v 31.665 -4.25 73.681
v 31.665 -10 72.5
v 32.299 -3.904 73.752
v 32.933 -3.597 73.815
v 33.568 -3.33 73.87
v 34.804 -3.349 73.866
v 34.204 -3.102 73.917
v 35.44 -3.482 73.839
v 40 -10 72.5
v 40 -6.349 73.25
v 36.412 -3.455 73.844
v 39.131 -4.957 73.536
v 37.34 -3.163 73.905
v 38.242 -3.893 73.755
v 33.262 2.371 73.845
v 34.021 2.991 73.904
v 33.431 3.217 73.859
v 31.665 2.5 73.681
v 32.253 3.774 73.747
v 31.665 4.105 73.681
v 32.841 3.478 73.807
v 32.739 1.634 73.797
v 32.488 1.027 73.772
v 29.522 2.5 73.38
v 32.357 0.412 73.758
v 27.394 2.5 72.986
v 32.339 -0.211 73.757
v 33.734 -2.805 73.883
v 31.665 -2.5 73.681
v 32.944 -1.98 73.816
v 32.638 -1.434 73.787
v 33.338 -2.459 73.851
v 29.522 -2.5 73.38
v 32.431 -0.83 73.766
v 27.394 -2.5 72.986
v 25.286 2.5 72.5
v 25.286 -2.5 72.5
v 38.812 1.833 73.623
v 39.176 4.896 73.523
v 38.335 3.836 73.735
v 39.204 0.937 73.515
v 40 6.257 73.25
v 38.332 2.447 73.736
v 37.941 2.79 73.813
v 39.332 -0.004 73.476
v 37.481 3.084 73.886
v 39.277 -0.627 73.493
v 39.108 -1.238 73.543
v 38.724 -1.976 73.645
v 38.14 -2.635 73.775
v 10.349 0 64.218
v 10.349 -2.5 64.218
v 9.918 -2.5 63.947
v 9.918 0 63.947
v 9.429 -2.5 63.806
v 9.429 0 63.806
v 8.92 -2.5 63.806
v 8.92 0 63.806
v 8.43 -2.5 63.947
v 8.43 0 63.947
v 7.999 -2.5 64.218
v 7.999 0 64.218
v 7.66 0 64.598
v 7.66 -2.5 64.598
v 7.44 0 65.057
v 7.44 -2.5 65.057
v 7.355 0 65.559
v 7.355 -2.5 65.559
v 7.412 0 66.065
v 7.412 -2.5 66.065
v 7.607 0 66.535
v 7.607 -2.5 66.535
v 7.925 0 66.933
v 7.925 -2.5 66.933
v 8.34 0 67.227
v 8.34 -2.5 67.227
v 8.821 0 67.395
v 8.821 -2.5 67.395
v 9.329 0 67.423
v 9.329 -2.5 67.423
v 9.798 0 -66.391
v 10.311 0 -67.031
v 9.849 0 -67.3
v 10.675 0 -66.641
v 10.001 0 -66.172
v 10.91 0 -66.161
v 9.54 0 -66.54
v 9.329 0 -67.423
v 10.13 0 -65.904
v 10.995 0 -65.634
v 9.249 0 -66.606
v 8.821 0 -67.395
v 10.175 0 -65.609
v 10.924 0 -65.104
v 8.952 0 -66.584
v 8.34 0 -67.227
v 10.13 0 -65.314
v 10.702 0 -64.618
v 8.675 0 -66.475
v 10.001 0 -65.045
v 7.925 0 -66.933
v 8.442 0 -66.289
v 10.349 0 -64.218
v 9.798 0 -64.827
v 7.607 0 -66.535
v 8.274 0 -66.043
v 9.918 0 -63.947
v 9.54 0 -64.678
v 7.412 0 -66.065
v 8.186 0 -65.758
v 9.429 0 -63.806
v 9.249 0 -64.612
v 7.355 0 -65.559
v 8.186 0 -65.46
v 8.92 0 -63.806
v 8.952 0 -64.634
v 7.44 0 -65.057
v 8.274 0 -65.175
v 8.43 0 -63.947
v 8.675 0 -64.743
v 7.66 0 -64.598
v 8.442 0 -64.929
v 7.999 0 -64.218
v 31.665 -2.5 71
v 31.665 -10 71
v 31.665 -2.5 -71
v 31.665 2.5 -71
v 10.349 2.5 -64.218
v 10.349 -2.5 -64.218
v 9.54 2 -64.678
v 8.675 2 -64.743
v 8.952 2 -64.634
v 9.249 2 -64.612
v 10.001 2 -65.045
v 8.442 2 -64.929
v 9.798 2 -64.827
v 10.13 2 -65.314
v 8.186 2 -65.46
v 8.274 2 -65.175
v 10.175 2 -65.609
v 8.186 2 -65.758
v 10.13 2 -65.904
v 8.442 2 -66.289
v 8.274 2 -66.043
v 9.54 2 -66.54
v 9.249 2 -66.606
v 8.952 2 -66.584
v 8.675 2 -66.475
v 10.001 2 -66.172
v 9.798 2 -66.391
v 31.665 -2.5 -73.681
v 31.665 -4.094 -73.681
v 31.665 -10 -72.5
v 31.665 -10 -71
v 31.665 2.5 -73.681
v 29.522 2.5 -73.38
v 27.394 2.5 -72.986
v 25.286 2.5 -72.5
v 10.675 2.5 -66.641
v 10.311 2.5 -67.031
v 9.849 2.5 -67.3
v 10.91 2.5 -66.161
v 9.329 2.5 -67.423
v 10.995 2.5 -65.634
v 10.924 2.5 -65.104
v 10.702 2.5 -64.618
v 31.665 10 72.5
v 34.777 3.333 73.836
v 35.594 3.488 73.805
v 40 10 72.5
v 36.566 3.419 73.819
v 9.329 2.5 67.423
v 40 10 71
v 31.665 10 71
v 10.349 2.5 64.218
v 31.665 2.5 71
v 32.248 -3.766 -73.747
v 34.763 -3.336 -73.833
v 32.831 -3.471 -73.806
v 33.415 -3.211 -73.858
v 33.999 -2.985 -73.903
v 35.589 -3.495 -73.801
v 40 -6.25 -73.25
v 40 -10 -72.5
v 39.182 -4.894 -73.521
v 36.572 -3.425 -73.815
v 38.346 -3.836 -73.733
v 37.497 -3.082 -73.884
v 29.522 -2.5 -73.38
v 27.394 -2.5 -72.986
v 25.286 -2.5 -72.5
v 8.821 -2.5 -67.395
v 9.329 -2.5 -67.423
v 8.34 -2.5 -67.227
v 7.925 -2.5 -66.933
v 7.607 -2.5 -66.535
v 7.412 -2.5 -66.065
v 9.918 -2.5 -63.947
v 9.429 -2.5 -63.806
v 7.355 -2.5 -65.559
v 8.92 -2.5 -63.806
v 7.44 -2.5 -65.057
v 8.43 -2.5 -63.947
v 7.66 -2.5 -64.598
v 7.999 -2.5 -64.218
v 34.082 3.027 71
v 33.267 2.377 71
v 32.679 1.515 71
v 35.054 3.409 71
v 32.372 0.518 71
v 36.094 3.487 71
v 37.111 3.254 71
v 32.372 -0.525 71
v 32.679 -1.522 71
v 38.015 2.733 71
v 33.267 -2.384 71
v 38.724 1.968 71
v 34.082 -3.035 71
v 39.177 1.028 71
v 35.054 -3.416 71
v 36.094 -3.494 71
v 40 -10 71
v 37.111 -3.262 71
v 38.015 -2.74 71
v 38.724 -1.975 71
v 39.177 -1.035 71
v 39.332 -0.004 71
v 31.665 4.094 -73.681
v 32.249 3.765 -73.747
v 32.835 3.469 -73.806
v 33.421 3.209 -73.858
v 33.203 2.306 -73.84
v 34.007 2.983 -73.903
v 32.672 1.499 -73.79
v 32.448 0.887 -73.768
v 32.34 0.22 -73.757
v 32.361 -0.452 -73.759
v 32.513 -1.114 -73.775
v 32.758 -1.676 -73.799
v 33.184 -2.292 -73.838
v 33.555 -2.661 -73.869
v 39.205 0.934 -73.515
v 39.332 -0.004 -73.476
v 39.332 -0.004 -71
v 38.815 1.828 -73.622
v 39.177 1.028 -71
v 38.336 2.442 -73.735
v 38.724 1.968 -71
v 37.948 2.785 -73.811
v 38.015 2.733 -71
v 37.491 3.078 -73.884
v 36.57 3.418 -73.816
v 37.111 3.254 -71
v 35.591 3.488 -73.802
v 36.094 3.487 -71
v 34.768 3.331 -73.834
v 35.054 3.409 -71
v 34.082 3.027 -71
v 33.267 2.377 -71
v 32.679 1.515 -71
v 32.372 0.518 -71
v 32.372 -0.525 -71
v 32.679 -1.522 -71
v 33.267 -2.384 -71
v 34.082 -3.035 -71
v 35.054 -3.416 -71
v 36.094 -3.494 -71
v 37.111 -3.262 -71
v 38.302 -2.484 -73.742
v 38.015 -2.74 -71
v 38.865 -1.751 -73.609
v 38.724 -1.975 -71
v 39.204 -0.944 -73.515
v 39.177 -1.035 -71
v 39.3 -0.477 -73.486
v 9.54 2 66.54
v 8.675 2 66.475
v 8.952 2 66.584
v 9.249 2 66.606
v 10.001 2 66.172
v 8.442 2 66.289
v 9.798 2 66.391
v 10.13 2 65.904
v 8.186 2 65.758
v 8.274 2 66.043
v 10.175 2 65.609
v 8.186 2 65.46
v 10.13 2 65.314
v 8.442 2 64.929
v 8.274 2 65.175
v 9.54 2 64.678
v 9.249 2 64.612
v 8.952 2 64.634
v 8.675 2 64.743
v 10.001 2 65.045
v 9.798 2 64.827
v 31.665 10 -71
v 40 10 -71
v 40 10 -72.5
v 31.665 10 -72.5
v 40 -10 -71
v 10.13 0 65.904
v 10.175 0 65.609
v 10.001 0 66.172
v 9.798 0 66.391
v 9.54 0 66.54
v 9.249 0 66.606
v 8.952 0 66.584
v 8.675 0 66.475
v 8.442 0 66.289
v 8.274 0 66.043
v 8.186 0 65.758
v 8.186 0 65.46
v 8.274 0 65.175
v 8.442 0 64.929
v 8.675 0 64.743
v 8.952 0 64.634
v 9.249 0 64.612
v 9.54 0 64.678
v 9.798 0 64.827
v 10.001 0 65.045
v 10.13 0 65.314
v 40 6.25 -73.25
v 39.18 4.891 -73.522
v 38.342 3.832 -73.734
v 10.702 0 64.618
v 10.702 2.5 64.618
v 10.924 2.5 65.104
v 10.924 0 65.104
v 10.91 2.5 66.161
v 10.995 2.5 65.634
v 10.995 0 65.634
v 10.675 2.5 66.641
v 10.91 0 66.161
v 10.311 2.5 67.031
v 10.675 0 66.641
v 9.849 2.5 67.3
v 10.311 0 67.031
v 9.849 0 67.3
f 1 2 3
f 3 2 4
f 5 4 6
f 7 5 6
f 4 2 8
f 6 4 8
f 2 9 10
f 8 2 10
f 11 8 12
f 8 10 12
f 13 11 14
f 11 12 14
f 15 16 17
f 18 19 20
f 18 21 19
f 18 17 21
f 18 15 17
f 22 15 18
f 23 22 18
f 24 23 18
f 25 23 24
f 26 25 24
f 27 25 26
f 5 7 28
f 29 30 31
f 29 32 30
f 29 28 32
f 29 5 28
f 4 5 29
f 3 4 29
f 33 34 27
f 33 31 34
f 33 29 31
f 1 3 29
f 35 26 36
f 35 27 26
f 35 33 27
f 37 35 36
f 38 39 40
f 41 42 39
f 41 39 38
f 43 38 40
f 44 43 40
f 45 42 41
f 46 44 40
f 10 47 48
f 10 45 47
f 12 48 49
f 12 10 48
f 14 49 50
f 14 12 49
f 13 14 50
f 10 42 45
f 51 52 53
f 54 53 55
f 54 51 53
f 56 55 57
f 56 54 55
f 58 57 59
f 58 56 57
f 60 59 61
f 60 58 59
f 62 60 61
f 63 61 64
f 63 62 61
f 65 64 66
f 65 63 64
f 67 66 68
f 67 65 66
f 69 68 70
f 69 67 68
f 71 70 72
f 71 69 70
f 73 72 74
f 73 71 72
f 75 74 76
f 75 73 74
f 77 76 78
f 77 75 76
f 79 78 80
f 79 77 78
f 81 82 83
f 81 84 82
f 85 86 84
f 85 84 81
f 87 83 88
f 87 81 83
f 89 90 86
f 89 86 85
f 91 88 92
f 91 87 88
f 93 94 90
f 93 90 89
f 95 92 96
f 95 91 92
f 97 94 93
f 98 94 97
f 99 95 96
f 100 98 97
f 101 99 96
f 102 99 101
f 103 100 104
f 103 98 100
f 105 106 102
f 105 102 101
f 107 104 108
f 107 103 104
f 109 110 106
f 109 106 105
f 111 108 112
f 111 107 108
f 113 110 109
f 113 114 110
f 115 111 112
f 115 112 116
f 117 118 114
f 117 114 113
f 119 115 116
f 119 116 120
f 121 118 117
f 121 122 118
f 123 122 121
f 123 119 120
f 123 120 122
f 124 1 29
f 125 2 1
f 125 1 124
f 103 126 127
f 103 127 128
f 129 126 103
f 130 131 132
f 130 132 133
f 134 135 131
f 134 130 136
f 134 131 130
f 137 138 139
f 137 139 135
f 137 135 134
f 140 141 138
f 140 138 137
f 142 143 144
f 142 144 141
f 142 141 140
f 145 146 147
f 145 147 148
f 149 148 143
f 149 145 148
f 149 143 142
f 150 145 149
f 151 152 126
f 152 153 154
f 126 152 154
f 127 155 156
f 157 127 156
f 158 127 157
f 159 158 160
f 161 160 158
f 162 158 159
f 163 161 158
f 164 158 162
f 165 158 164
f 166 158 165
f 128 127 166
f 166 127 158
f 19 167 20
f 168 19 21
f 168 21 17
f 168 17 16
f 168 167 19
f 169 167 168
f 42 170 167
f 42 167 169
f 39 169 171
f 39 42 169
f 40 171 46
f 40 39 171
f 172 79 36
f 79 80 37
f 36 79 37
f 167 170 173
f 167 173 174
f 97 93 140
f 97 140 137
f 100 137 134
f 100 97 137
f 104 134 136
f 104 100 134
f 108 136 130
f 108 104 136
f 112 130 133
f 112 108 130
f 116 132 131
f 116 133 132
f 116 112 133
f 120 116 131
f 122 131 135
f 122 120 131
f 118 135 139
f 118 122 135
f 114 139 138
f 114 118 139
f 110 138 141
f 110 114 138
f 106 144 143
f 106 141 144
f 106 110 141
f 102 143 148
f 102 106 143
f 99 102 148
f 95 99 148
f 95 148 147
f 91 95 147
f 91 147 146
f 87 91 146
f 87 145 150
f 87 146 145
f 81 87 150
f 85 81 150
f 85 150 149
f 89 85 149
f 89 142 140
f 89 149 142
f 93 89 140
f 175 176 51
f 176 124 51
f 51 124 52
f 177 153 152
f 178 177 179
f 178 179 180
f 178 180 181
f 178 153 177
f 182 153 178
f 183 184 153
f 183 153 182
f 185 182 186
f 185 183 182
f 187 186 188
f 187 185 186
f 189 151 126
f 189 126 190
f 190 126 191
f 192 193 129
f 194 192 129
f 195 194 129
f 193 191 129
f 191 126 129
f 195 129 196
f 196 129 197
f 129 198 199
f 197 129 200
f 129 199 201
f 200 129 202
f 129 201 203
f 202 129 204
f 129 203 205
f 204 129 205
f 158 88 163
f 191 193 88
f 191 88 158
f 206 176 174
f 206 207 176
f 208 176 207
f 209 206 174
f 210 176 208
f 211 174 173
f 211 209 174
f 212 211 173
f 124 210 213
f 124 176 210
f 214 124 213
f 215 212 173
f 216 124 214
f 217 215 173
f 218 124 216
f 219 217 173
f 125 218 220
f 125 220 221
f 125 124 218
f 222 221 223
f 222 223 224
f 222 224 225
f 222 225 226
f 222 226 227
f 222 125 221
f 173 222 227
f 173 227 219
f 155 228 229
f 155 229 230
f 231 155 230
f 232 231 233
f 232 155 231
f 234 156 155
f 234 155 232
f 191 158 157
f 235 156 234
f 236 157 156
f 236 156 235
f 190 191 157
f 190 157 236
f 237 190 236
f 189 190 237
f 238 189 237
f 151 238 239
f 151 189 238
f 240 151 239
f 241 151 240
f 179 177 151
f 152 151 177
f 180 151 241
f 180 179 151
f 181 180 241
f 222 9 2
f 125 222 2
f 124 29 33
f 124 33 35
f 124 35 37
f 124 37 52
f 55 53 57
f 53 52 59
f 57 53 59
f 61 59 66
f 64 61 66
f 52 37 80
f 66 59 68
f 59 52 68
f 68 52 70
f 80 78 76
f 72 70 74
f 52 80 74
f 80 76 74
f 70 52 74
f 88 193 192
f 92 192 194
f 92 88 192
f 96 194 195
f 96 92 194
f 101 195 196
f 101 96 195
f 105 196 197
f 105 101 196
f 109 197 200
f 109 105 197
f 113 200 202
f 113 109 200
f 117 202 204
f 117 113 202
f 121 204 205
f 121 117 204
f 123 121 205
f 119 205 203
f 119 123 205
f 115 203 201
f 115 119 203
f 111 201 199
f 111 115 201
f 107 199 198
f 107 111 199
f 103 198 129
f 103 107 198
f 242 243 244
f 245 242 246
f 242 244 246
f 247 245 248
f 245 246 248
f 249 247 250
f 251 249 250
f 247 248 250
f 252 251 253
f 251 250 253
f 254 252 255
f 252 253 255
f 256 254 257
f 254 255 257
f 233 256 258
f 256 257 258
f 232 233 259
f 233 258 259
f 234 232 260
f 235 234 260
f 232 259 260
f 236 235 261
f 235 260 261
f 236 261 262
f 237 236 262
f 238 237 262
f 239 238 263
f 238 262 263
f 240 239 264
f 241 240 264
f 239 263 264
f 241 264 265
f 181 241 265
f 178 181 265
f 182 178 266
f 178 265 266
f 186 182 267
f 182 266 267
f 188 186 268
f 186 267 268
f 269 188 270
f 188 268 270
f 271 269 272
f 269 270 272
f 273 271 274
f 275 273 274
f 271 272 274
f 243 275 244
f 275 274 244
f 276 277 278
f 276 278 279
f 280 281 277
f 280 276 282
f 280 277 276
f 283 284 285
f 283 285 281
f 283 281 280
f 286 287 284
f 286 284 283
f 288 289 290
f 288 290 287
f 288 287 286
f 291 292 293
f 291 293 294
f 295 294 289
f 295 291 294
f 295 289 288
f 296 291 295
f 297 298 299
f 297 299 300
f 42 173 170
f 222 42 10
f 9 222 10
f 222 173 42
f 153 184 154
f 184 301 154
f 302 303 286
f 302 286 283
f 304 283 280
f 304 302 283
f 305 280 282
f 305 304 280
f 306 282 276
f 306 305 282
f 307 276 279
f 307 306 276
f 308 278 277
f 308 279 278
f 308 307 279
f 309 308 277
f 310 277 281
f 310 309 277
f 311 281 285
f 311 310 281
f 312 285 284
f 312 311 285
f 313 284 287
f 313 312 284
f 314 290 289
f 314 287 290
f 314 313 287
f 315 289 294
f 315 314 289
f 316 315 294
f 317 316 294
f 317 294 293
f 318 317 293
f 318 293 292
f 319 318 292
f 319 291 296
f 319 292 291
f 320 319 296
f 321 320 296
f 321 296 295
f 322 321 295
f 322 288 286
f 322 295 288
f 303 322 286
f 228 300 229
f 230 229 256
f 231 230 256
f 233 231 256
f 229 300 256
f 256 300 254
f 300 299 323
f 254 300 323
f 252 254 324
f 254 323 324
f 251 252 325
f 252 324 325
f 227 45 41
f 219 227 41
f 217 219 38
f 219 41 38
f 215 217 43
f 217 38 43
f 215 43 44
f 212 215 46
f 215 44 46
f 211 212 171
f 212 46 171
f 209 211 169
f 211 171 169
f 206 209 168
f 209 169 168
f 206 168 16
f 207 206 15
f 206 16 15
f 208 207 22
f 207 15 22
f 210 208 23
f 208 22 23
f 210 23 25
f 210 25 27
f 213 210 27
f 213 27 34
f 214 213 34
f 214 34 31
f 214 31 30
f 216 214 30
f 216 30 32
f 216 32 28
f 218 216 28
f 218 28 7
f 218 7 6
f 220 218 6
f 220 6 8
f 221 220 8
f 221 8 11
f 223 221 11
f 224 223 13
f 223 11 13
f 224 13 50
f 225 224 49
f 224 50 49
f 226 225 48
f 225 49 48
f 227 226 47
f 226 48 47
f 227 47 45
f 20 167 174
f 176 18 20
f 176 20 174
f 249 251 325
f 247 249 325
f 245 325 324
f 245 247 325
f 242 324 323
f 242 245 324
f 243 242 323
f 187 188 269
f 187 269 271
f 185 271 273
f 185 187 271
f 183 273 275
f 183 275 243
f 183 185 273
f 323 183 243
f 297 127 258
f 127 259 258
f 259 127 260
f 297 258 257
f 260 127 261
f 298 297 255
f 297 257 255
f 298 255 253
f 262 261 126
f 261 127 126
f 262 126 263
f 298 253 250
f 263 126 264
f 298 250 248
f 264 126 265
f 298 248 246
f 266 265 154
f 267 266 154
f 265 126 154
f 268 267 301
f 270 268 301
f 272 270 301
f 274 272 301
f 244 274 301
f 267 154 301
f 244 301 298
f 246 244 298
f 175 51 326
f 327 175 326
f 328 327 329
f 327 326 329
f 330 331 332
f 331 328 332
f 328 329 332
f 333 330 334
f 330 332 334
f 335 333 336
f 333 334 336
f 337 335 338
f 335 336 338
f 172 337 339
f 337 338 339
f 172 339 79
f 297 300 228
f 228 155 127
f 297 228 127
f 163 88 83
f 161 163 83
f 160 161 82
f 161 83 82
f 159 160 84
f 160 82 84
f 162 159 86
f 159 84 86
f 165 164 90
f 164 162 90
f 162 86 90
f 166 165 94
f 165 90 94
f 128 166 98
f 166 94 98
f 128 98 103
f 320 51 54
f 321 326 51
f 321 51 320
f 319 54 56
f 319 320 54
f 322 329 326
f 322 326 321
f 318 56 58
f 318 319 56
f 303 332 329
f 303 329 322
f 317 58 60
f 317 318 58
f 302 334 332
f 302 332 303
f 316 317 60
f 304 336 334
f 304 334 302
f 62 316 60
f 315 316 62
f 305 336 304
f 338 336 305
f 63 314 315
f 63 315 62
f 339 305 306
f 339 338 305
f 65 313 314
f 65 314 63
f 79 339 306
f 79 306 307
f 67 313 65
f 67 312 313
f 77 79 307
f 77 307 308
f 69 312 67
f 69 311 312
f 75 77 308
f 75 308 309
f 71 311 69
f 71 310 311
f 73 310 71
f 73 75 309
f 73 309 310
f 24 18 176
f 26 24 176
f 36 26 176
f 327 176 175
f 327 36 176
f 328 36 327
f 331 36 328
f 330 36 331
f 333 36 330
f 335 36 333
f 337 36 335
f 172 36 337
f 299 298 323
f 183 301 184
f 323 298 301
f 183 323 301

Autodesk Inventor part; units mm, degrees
ref_plane "YZ Plane" through (0, 0, 0) normal (1, 0, 0) x (0, 1, 0)
ref_plane "XZ Plane" through (0, 0, 0) normal (0, 1, 0) x (-1, 0, 0)
ref_plane "XY Plane" through (0, 0, 0) normal (0, 0, 1) x (1, 0, 0)
sketch "Skizze1" plane through (0, 0, 0) normal (0, 0, 1) x (1, 0, 0)
  point P0 (0, 0)
sketch "Skizze2" plane through (0, 0, 0) normal (0, 1, 0) x (-1, 0, 0)
  line L0 (2.5, 30.2385) -> (-2.5, 30.2385)
  line L1 (-2.5, 30.2385) -> (-2.5, -30.2385)
  line L2 (-2.5, -30.2385) -> (2.5, -30.2385)
  line L3 (2.5, -30.2385) -> (2.5, 30.2385)
  line L4 (-2.5, 49) -> (-2.5, -49)
  line L5 (2.5, -49) -> (2.5, 49)
  circle A0 centre (0, 49) radius 2.5
  circle A1 centre (0, -49) radius 2.5
  line L6 (-9.3293, 67.423) -> (-30, 74)
  line L7 (-7.3602, 65.7604) -> (0, 51.5)
  line L8 (-31.665, 71) -> (-10.3492, 64.2177)
  line L9 (-10.3492, 64.2177) -> (-2.4949, 49)
  line L10 (-31.665, 71) -> (-40, 71)
  line L11 (-30, 74) -> (-40, 74)
  line L12 (-10.3492, 64.2177) -> (-8, 67)
  circle A2 centre (-9.1746, 65.6088) radius 1.8207
  line L13 (-40, 71) -> (-40, 74)
  circle A3 centre (-9.1746, 65.6088) radius 0.9616
  line L14 (-7.3602, -65.7604) -> (0, -51.5)
  circle A4 centre (-9.1746, -65.6088) radius 0.9616
  circle A5 centre (-9.1746, -65.6088) radius 1.8207
  line L15 (-10.3492, -64.2177) -> (-2.4949, -49)
  line L16 (-31.665, -71) -> (-10.3492, -64.2177)
  line L17 (-9.3293, -67.423) -> (-30, -74)
  line L18 (-30, -74) -> (-40, -74)
  line L19 (-40, -71) -> (-40, -74)
  line L20 (-31.665, -71) -> (-40, -71)
  point P0 (0, 0)
  point P1 (0, 0)
  point P2 (0, -30.2385)
  point P3 (2.5, 0)
  point P4 (2.5, 0)
  point P5 (-48.2893, 0)
  dimension "d0" = 5
extrude "Extrusion1" add sketch "Skizze2" along normal mid plane 5 contours L8 L10 L13 L11 L6 A2 | A5 L17 L18 L19 L20 L16
extrude "Extrusion2" add sketch "Skizze2" against normal blind 2.5 contours A2 L12 A3 | A2 L12 A3 | A5 | A3 L12 | L12 A3 | A4
ref_plane "Arbeitsebene1" through (10.3492, 2.5, -64.2177) normal (0, 1, 0) x (1, 0, 0)
sketch "Skizze3" plane through (0, 0, 0) normal (0, 1, 0) x (-1, 0, 0)
  line L0 (-30, 74) -> (-40, 74) projected
  line L1 (-31.665, 71) -> (-10.3492, 64.2177) projected
  line L2 (-40, 74) -> (-31.665, 74)
  line L3 (-31.665, 74) -> (-31.665, 71)
  line L4 (-31.665, 71) -> (-40, 71)
  line L5 (-40, 71) -> (-40, 74)
  line L6 (-40, -71) -> (-40, -74) projected
  line L7 (-31.665, -71) -> (-40, -71) projected
  line L8 (-40, -74) -> (-31.665, -74)
  line L9 (-31.665, -74) -> (-31.665, -71)
  line L10 (-31.665, -71) -> (-40, -71)
  line L11 (-40, -71) -> (-40, -74)
  point P0 (0, 0)
extrude "Extrusion3" add sketch "Skizze3" along normal mid plane 20
sketch "Skizze4" plane through (30, -2.5, 74) normal (0, 0, 1) x (1, 0, 0)
  circle A0 centre (5.8325, 2.4963) radius 3.5
  point P0 (-30, 2.5)
  point P1 (1.665, 5)
  dimension "d27" = 7
extrude "Extrusion4" cut sketch "Skizze4" against normal blind 150
sketch "Skizze5" plane through (40, -10, 71) normal (1, 0, 0) x (0, 0, -1)
  line L0 (0, 0) -> (0, 7.5) projected
  line L1 (-3, 0) -> (-3, 20) projected
  line L2 (-1.5, 0) -> (-3, 0)
  line L3 (-3, 0) -> (-3, 7.3019)
  line L4 (-3, 12.5) -> (-3, 20) projected
  line L5 (0, 0) -> (0, 20) projected
  line L6 (-3, 20) -> (-1.5, 20)
  line L7 (0, 12.5139) -> (-3, 12.5139)
  line L8 (-3, 12.5139) -> (-3, 20)
  line L9 (0, 20) -> (-3, 20) projected
  line L10 (-1.5, 20) -> (-3, 12.5139)
  line L11 (-3, 0) -> (0, 0) projected
  line L12 (-1.5, 0) -> (-3, 7.3019)
  point P0 (71, 10)
extrude "Extrusion5" cut sketch "Skizze5" against normal blind 10 contours L2 L1 L12 | L1 L6 L10
sketch "Skizze6" plane through (40, -10, -74) normal (1, 0, 0) x (0, 0, -1)
  line L0 (-3, 7.5) -> (-3, 0) projected
  line L1 (-3, 0) -> (0, 0) projected
  line L2 (0, 7.5) -> (0, 0)
  line L3 (0, 0) -> (-1.5, 0)
  line L4 (-3, 12.5) -> (0, 12.5) projected
  line L5 (0, 12.5) -> (0, 20) projected
  line L6 (0, 12.5) -> (0, 20)
  line L7 (0, 20) -> (-1.5, 20)
  line L8 (0, 20) -> (-3, 20) projected
  line L9 (-1.5, 20) -> (0, 12.5)
  line L10 (0, 0) -> (0, 7.5) projected
  line L11 (-1.5, 0) -> (0, 7.5)
  point P0 (-74, 10)
extrude "Extrusion6" cut sketch "Skizze6" against normal blind 10
sketch "Skizze7" plane through (40, -10, -71) normal (1, 0, 0) x (0, 0, -1)
  point P0 (-71, 10)
sketch "Skizze8" plane through (0, -10, 0) normal (0, -1, 0) x (1, 0, 0)
  line L0 (9.3293, -67.423) -> (30, -74) projected
  line L1 (40, -71) -> (40, -72.5) projected
  line L2 (31.665, -74) -> (40, -74) projected
  line L3 (35.8325, -74) -> (40, -74)
  line L4 (40, -74) -> (40, -73.25)
  line L5 (40, -74) -> (40, -72.5) projected
  arc A0 (35.8325, -74) -> (40, -73.25) centre (35.8325, -62.0462) ccw
  line L6 (39.3325, -74) -> (32.3325, -74) projected
  line L7 (40, -72.5) -> (31.665, -72.5) projected
  line L8 (41.6903, 0) -> (29.392, 0)
  line L9 (31.665, 74) -> (40, 74)
  line L10 (40, 74) -> (40, 73.25)
  arc A1 (40, 73.25) -> (35.8325, 74) centre (35.8325, 62.0462) ccw
  point P0 (0, 0)
  point P1 (35.8325, 74)
extrude "Extrusion7" cut sketch "Skizze8" against normal blind 20
sketch "Skizze9" plane through (0, -10, 0) normal (0, -1, 0) x (1, 0, 0)
  line L0 (31.665, 74) -> (33.5986, 74) projected
  line L1 (40, 72.5) -> (31.665, 72.5) projected
  line L2 (31.665, 74) -> (30, 74) projected
  line L3 (30, 74) -> (35.8325, 74)
  line L4 (9.3293, 67.423) -> (30, 74) projected
  line L5 (30, 74) -> (25.2857, 74)
  line L6 (25.2857, 74) -> (25.2857, 72.5)
  arc A0 (35.8325, 74) -> (25.2857, 72.5) centre (37.5594, 24.0298) ccw
  line L7 (42.1638, 0) -> (18.6987, 0) construction
  line L8 (31.665, -74) -> (35.8325, -74)
  line L9 (31.665, -74) -> (30, -74)
  line L10 (30, -74) -> (25.2857, -74)
  line L11 (25.2857, -74) -> (25.2857, -72.5)
  arc A1 (25.2857, -72.5) -> (35.8325, -74) centre (37.5594, -24.0298) ccw
  point P0 (0, 0)
  point P1 (35.8325, 74)
  point P2 (35.8325, -74)
  point P3 (35.8325, 74)
extrude "Extrusion8" cut sketch "Skizze9" against normal blind 20
sketch "Skizze10" plane through (0, 0, 0) normal (0, 1, 0) x (1, 0, 0)
  arc A0 (9.3293, 67.423) -> (10.3492, 64.2177) centre (9.1746, 65.6088) ccw projected
  circle A1 centre (9.1746, 65.6088) radius 1
  line L0 (3.0459, 0) -> (11.7112, 0) construction
  circle A2 centre (9.1746, -65.6088) radius 1
  point P0 (0, 0)
  dimension "d21" = 2
extrude "Extrusion10" add sketch "Skizze10" along normal blind 2
ref_plane "Arbeitsebene3" through (40.9441, -2.0037, 73.9117) normal (0.0345377, 0, 0.9994034) x (0, 1, 0)
ref_plane "Arbeitsebene2" through (35.8325, -2.0037, -74) normal (0.0345377, 0, 0.9994034) x (0, 1, 0)
